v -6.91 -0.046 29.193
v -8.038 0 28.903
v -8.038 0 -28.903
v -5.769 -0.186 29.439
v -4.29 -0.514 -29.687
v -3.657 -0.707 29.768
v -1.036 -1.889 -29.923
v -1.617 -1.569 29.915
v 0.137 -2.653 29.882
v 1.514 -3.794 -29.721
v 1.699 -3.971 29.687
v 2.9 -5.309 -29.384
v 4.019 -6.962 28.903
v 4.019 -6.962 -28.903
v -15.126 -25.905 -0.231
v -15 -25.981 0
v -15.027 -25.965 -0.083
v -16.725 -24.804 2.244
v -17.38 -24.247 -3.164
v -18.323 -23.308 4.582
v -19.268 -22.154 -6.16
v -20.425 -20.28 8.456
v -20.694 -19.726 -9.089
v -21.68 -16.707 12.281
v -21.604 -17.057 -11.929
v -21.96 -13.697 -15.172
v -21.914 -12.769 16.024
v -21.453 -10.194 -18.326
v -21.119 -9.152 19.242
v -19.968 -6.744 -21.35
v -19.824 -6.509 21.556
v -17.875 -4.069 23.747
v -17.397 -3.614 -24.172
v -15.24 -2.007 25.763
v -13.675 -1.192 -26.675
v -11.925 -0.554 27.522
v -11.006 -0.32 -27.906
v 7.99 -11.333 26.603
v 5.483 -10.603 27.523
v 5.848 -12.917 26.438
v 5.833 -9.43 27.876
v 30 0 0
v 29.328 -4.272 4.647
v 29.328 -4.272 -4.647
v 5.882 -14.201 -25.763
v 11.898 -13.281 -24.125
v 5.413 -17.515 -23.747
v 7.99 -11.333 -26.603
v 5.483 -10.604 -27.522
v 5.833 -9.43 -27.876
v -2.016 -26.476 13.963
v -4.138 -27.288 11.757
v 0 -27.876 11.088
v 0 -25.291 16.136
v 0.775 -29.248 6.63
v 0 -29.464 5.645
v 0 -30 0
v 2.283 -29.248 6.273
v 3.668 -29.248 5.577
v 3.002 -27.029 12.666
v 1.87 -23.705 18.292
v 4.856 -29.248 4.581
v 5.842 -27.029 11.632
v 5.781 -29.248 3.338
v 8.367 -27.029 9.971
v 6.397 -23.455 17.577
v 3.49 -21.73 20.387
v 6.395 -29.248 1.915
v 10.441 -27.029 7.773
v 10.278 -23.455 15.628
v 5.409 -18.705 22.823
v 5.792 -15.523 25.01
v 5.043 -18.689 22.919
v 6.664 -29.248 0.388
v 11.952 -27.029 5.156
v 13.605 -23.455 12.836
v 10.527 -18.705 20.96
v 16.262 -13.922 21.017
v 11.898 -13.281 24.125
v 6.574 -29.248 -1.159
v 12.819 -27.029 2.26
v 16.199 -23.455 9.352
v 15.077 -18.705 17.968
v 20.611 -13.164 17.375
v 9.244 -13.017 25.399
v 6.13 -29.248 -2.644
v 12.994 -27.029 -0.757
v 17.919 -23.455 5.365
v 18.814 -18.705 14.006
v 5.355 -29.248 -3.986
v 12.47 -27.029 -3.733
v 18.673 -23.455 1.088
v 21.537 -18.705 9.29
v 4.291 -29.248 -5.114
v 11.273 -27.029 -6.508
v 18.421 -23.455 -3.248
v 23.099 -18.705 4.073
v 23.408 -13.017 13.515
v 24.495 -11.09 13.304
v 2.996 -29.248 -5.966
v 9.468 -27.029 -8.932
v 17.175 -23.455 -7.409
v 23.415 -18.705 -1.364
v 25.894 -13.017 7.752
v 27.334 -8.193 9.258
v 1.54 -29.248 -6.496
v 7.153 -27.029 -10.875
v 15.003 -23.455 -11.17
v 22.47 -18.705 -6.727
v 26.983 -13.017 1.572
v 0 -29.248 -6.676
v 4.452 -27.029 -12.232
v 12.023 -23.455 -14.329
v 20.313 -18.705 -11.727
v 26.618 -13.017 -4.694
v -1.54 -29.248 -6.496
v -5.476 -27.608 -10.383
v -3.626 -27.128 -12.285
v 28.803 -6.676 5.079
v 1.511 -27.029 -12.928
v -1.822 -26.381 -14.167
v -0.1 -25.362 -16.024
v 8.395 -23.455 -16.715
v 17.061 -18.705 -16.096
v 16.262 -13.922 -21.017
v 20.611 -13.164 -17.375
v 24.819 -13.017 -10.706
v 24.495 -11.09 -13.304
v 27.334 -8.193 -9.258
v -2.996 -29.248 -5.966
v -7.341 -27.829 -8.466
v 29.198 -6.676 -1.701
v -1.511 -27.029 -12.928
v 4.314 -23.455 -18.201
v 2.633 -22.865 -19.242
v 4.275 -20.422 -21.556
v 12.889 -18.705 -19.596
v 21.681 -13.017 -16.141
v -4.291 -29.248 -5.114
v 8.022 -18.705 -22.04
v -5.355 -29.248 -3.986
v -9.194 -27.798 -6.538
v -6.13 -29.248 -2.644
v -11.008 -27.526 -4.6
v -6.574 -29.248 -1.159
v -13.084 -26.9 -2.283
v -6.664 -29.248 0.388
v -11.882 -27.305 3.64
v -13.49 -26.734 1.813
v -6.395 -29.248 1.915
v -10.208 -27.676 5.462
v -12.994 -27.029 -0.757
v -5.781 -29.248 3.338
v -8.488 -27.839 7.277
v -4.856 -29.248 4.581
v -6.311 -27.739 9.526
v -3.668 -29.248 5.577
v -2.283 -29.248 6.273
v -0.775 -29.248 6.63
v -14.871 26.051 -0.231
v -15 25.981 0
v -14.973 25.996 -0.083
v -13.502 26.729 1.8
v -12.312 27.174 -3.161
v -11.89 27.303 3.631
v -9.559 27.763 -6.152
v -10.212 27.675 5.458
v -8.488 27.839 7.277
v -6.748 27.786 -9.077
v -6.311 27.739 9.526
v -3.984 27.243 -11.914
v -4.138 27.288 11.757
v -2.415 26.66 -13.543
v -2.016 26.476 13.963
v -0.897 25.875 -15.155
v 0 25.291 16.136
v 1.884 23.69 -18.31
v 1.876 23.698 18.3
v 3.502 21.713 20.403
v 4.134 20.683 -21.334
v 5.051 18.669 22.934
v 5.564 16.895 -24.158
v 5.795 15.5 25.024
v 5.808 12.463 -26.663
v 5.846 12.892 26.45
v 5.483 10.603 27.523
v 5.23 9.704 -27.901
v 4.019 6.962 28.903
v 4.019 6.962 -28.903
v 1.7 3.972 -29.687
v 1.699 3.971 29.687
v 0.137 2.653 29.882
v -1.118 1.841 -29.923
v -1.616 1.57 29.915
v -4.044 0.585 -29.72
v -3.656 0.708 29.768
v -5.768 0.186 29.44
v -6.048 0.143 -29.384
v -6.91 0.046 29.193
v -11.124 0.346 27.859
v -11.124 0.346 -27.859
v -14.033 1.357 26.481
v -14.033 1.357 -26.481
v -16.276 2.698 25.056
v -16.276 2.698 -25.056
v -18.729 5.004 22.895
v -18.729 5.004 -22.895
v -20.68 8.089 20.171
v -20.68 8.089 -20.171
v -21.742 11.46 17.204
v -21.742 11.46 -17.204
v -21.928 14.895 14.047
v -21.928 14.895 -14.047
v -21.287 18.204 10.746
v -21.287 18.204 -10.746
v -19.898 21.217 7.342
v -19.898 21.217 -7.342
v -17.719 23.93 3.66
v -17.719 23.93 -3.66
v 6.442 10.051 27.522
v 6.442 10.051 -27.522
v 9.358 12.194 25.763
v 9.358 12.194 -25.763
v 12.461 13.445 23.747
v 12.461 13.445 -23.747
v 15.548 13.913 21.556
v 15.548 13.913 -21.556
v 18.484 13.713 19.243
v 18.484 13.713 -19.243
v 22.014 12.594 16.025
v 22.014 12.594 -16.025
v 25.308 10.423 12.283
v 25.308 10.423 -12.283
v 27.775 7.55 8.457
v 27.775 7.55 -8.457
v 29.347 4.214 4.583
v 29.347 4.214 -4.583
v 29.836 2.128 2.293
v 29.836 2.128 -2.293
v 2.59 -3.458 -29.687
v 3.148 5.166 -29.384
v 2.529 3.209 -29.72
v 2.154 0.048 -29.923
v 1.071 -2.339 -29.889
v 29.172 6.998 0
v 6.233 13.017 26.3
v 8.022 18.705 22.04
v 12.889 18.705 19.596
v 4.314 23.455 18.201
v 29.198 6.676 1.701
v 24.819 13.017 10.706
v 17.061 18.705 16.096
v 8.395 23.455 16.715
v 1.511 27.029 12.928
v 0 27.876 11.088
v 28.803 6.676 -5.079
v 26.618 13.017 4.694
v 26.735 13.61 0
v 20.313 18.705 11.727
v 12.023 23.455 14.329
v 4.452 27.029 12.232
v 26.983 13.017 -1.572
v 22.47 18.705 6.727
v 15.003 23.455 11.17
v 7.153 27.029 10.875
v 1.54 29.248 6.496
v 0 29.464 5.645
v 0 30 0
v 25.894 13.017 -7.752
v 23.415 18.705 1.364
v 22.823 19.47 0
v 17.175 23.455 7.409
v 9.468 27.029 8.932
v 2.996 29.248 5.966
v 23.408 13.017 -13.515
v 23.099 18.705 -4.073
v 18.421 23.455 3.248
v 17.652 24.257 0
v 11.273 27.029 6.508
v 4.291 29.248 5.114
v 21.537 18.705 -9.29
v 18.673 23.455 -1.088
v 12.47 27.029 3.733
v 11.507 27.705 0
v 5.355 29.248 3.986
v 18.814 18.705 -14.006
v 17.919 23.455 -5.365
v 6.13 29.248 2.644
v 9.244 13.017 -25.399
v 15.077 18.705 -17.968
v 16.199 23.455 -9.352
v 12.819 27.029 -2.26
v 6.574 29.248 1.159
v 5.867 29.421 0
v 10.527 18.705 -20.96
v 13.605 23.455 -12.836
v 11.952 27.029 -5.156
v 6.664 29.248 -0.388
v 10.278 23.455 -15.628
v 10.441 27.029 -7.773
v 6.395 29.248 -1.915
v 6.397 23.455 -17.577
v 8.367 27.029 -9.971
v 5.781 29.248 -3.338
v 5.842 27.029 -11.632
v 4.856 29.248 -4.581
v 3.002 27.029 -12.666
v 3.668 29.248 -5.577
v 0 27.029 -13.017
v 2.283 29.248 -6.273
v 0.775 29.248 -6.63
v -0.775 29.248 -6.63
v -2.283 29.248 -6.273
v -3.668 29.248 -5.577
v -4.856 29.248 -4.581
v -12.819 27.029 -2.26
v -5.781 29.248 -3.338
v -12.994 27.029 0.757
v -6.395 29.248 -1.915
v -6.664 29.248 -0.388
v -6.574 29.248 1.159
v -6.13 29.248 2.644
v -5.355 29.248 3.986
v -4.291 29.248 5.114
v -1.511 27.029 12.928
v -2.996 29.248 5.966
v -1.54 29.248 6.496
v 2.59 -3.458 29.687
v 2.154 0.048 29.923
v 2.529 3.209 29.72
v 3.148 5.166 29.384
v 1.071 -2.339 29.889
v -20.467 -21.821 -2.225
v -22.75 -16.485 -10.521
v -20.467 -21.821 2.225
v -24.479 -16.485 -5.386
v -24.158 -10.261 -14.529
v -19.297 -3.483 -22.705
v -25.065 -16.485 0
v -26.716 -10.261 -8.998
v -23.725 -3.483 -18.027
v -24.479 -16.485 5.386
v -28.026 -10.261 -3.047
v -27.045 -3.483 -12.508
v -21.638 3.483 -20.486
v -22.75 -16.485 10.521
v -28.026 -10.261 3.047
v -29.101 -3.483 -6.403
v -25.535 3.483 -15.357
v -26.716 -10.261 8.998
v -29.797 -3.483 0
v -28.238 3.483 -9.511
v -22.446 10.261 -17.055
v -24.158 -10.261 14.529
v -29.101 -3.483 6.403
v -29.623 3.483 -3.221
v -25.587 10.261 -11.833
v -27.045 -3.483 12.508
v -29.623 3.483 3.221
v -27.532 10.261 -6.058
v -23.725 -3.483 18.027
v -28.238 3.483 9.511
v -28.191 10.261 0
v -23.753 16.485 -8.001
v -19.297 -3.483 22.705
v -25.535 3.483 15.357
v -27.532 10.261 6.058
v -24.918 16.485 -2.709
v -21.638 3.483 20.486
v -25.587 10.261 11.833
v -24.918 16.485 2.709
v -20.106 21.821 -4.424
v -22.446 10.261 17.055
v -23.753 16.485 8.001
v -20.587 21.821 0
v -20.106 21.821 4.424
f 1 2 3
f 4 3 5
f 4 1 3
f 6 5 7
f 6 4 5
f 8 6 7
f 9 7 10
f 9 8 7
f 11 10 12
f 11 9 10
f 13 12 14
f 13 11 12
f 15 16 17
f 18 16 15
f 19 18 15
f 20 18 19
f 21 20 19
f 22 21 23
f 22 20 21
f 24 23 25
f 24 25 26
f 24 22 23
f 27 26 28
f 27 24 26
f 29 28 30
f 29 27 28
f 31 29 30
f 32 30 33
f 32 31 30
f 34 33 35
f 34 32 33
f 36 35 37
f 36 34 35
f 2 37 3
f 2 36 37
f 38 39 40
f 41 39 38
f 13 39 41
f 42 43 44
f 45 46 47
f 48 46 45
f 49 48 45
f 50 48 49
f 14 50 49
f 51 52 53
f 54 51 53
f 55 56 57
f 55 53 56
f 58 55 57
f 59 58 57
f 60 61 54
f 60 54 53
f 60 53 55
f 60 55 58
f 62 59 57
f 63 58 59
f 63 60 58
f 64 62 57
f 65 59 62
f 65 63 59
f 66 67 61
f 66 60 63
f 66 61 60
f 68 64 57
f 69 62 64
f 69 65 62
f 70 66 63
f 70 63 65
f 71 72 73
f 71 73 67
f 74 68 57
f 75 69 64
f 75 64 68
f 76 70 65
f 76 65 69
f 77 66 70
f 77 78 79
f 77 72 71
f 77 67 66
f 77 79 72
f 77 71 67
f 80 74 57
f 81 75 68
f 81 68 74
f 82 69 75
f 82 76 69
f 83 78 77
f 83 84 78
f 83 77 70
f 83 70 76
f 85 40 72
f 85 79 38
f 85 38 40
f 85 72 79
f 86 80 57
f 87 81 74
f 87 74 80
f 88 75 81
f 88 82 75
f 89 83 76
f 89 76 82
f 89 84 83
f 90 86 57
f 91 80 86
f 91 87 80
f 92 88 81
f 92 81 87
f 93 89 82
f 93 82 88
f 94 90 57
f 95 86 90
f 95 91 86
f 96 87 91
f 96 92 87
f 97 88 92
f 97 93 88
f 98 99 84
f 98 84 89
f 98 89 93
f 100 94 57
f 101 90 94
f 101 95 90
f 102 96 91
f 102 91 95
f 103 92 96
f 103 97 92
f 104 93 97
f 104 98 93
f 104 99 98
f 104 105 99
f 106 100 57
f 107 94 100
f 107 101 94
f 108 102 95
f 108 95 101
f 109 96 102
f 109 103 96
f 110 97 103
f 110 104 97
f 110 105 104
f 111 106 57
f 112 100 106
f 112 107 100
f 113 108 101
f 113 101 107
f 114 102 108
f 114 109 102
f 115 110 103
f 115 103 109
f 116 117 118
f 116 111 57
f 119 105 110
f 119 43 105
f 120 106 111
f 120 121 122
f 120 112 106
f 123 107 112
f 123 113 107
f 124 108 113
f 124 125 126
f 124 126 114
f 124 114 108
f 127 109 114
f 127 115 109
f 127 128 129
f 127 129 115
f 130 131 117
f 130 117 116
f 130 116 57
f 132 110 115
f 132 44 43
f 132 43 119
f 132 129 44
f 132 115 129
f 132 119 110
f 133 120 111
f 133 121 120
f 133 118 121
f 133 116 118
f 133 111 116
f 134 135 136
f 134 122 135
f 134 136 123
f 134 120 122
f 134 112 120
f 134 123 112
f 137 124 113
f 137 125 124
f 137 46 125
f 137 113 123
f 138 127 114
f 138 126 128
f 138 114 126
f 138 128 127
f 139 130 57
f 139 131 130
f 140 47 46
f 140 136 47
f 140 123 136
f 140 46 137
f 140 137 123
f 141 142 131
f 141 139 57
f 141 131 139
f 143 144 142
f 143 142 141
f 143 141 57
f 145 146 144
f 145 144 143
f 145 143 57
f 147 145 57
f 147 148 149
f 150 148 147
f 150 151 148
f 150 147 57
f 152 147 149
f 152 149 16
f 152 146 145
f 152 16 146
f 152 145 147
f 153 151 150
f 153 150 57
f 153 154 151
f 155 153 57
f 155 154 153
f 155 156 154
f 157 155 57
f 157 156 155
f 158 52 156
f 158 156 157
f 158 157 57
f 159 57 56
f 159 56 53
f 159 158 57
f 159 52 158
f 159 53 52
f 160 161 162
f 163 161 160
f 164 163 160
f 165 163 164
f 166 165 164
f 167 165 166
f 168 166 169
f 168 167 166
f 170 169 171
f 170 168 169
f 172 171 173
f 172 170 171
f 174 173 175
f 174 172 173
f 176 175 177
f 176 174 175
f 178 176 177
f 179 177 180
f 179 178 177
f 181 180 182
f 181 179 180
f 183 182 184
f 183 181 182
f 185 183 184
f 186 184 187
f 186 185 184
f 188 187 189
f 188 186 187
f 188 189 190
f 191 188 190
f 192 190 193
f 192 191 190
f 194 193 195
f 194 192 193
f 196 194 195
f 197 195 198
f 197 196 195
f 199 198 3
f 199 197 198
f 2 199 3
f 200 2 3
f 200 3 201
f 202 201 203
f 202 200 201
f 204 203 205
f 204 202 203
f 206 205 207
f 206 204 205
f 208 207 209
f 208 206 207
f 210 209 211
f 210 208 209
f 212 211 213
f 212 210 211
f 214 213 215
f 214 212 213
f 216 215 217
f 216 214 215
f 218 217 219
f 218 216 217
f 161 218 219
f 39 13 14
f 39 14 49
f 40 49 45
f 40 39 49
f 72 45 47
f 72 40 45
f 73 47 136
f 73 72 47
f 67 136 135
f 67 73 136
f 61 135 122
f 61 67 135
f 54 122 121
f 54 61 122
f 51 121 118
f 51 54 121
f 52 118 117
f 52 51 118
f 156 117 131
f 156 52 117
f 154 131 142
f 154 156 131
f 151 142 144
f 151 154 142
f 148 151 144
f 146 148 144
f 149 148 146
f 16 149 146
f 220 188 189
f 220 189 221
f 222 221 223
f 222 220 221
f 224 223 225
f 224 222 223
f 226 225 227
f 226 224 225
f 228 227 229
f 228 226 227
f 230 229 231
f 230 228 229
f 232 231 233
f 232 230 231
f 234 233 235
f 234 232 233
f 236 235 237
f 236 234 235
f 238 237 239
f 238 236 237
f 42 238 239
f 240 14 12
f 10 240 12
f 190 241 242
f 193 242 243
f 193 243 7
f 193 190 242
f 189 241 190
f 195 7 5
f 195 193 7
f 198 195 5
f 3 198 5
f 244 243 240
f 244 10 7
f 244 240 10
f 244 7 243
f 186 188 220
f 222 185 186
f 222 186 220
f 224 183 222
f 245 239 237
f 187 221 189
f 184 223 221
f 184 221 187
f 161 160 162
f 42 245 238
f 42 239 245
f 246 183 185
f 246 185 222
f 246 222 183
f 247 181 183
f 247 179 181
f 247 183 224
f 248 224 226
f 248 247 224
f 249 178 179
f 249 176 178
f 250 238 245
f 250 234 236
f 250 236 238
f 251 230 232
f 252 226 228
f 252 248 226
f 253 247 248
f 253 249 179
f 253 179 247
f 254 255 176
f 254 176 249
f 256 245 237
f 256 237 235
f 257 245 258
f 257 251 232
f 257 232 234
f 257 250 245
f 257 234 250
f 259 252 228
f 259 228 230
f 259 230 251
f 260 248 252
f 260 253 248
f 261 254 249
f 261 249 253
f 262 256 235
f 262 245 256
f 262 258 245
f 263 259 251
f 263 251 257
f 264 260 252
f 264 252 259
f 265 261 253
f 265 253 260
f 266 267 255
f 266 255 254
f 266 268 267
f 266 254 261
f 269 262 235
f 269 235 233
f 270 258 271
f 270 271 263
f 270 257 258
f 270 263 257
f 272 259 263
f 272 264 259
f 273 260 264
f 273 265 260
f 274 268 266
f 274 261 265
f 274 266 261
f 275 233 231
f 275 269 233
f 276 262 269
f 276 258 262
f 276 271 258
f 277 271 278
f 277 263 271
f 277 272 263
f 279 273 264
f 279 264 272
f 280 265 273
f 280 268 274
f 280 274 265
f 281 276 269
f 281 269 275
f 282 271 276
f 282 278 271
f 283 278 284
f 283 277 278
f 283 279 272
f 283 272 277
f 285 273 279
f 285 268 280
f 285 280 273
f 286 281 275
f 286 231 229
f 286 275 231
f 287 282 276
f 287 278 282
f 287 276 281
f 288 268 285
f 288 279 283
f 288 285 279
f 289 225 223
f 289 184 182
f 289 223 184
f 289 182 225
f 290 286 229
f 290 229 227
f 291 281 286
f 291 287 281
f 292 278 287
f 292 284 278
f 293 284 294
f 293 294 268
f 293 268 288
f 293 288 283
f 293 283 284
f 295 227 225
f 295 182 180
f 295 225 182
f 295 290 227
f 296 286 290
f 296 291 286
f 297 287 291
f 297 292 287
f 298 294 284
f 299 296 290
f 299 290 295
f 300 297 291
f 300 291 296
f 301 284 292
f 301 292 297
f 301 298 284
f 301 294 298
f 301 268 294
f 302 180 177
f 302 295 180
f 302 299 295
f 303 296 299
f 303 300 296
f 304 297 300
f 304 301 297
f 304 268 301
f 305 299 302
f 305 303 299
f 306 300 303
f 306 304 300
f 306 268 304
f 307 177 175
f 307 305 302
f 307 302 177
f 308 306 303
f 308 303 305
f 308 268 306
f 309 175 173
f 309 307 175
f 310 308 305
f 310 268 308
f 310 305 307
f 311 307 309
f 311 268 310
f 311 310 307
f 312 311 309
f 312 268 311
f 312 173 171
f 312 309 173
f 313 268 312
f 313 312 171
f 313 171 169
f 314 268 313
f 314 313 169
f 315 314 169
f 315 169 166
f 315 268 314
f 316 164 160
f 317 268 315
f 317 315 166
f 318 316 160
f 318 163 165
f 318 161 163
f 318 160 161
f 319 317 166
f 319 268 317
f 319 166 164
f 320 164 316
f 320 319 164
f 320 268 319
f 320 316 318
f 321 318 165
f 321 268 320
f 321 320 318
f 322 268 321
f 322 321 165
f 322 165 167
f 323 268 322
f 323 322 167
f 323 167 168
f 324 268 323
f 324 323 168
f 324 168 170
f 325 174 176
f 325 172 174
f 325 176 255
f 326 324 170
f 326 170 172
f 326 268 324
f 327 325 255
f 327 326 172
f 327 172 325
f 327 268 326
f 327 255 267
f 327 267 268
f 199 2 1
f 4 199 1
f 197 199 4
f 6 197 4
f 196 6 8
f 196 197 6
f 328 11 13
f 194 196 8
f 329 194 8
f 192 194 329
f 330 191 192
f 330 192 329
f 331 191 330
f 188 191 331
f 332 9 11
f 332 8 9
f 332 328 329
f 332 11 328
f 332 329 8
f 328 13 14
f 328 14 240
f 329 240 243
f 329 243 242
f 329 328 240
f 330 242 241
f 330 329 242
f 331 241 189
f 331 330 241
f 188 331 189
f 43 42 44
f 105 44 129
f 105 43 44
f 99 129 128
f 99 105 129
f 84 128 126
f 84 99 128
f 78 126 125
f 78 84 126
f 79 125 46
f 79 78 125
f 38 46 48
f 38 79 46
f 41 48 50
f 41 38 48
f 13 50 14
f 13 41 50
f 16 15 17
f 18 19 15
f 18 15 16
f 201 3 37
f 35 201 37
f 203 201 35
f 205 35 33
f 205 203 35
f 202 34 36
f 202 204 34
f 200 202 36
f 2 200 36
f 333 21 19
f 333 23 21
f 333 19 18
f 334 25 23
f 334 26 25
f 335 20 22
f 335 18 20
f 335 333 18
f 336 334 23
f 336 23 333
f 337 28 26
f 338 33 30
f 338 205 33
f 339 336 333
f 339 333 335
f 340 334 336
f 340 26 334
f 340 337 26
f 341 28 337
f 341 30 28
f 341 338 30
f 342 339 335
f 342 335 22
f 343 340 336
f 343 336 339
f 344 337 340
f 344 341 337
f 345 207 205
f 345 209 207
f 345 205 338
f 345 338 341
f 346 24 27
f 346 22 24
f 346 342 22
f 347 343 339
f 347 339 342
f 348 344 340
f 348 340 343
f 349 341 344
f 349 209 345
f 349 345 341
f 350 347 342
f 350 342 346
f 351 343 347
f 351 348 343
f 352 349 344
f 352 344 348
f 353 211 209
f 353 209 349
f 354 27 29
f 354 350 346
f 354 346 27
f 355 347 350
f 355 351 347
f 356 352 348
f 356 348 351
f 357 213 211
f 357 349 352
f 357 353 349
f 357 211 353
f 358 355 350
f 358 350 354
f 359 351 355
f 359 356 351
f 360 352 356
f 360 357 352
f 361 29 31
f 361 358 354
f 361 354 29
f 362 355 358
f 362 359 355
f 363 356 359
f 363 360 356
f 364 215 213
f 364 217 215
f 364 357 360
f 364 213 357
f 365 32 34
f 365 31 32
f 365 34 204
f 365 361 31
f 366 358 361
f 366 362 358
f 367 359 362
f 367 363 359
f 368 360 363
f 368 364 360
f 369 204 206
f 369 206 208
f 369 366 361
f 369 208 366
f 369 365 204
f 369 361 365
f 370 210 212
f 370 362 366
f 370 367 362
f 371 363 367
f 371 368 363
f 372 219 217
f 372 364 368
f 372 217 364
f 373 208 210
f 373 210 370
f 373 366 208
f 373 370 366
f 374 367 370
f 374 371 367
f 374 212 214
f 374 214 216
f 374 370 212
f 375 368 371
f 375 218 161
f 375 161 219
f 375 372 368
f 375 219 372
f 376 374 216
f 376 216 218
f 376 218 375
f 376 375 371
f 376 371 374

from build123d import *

# Parameters (mm, degrees)
EXTRUDE_1_DEPTH   = 50
EXTRUDE_1_2_DEPTH = 50
EXTRUDE_1_3_DEPTH = 50
EXTRUDE_1_4_DEPTH = 50


with BuildPart() as part:
    # 草图2 → 凸台-拉伸1 (new, symmetric)
    with BuildSketch(Plane.XY):
        with BuildLine():
            ThreePointArc((4.019237383, 6.961523355), (19.680501166, 13.448632213), (30, 0))
            ThreePointArc((30, 0), (14.999999961, 25.980762136), (-15.000000079, 25.980762068))
            ThreePointArc((-15.000000079, 25.980762068), (1.806606527, 23.768130107), (4.019237383, 6.961523355))
        make_face()
    extrude(amount=EXTRUDE_1_DEPTH, both=True)


with BuildPart() as body_2:
    # 草图2 → Extrude 1 2 (new, symmetric)
    with BuildSketch(Plane.XY):
        with BuildLine():
            ThreePointArc((-14.999999617, -25.980762335), (15.000000192, -25.980762003), (30, 0))
            ThreePointArc((30, 0), (19.680501101, -13.44863223), (4.019237316, -6.96152324))
            ThreePointArc((4.019237316, -6.96152324), (1.806606763, -23.768129871), (-14.999999617, -25.980762335))
        make_face()
    extrude(amount=EXTRUDE_1_2_DEPTH, both=True)


with BuildPart() as body_3:
    # 草图2 → Extrude 1 3 (new, symmetric)
    with BuildSketch(Plane.XY):
        with BuildLine():
            ThreePointArc((-8.038475803, 0), (-21.487107848, 10.319498319), (-15.000000079, 25.980762068))
            ThreePointArc((-15.000000079, 25.980762068), (-30, -2.67e-07), (-14.999999617, -25.980762335))
            ThreePointArc((-14.999999617, -25.980762335), (-21.487107917, -10.319498576), (-8.038475803, 0))
        make_face()
    extrude(amount=EXTRUDE_1_3_DEPTH, both=True)


with BuildPart() as body_4:
    # 草图2 → Extrude 1 4 (new, symmetric)
    with BuildSketch(Plane.XY):
        with BuildLine():
            ThreePointArc((4.019237316, -6.96152324), (2.153903092, 6.7e-08), (4.019237383, 6.961523355))
            ThreePointArc((4.019237383, 6.961523355), (-1.076951995, 1.865334536), (-8.038475803, 0))
            ThreePointArc((-8.038475803, 0), (-1.076952053, -1.865334502), (4.019237316, -6.96152324))
        make_face()
    extrude(amount=EXTRUDE_1_4_DEPTH, both=True)


with BuildPart() as cut_revolve_2_tool:
    # 草图3 → 切除-旋转2 (revolve)
    with BuildSketch(Plane(origin=(0, 0, 0), x_dir=(0, 0, -1), z_dir=(1, 0, 0))):
        with BuildLine():
            Line((0, 30), (0, 36.758603044))
            Line((0, 36.758603044), (-96.597700894, 36.758603044))
            Line((-96.597700894, 36.758603044), (-96.597700894, -39.921748707))
            Line((-96.597700894, -39.921748707), (0, -41.427468265))
            Line((0, -41.427468265), (0, -30))
            ThreePointArc((0, -30), (-30, 0), (0, 30))
        make_face()
    revolve(axis=Axis((0, 30, 0), (0, 1, 0)))


with BuildPart() as part_1:
    add(part.part)

    # 切除-旋转2: cut by cut_revolve_2_tool
    add(cut_revolve_2_tool.part, mode=Mode.SUBTRACT)


with BuildPart() as body_2_1:
    add(body_2.part)

    # 切除-旋转2: cut by cut_revolve_2_tool
    add(cut_revolve_2_tool.part, mode=Mode.SUBTRACT)


with BuildPart() as body_3_1:
    add(body_3.part)

    # 切除-旋转2: cut by cut_revolve_2_tool
    add(cut_revolve_2_tool.part, mode=Mode.SUBTRACT)


with BuildPart() as body_4_1:
    add(body_4.part)

    # 切除-旋转2: cut by cut_revolve_2_tool
    add(cut_revolve_2_tool.part, mode=Mode.SUBTRACT)


solid = Compound([part_1.part, body_2_1.part, body_3_1.part, body_4_1.part])
